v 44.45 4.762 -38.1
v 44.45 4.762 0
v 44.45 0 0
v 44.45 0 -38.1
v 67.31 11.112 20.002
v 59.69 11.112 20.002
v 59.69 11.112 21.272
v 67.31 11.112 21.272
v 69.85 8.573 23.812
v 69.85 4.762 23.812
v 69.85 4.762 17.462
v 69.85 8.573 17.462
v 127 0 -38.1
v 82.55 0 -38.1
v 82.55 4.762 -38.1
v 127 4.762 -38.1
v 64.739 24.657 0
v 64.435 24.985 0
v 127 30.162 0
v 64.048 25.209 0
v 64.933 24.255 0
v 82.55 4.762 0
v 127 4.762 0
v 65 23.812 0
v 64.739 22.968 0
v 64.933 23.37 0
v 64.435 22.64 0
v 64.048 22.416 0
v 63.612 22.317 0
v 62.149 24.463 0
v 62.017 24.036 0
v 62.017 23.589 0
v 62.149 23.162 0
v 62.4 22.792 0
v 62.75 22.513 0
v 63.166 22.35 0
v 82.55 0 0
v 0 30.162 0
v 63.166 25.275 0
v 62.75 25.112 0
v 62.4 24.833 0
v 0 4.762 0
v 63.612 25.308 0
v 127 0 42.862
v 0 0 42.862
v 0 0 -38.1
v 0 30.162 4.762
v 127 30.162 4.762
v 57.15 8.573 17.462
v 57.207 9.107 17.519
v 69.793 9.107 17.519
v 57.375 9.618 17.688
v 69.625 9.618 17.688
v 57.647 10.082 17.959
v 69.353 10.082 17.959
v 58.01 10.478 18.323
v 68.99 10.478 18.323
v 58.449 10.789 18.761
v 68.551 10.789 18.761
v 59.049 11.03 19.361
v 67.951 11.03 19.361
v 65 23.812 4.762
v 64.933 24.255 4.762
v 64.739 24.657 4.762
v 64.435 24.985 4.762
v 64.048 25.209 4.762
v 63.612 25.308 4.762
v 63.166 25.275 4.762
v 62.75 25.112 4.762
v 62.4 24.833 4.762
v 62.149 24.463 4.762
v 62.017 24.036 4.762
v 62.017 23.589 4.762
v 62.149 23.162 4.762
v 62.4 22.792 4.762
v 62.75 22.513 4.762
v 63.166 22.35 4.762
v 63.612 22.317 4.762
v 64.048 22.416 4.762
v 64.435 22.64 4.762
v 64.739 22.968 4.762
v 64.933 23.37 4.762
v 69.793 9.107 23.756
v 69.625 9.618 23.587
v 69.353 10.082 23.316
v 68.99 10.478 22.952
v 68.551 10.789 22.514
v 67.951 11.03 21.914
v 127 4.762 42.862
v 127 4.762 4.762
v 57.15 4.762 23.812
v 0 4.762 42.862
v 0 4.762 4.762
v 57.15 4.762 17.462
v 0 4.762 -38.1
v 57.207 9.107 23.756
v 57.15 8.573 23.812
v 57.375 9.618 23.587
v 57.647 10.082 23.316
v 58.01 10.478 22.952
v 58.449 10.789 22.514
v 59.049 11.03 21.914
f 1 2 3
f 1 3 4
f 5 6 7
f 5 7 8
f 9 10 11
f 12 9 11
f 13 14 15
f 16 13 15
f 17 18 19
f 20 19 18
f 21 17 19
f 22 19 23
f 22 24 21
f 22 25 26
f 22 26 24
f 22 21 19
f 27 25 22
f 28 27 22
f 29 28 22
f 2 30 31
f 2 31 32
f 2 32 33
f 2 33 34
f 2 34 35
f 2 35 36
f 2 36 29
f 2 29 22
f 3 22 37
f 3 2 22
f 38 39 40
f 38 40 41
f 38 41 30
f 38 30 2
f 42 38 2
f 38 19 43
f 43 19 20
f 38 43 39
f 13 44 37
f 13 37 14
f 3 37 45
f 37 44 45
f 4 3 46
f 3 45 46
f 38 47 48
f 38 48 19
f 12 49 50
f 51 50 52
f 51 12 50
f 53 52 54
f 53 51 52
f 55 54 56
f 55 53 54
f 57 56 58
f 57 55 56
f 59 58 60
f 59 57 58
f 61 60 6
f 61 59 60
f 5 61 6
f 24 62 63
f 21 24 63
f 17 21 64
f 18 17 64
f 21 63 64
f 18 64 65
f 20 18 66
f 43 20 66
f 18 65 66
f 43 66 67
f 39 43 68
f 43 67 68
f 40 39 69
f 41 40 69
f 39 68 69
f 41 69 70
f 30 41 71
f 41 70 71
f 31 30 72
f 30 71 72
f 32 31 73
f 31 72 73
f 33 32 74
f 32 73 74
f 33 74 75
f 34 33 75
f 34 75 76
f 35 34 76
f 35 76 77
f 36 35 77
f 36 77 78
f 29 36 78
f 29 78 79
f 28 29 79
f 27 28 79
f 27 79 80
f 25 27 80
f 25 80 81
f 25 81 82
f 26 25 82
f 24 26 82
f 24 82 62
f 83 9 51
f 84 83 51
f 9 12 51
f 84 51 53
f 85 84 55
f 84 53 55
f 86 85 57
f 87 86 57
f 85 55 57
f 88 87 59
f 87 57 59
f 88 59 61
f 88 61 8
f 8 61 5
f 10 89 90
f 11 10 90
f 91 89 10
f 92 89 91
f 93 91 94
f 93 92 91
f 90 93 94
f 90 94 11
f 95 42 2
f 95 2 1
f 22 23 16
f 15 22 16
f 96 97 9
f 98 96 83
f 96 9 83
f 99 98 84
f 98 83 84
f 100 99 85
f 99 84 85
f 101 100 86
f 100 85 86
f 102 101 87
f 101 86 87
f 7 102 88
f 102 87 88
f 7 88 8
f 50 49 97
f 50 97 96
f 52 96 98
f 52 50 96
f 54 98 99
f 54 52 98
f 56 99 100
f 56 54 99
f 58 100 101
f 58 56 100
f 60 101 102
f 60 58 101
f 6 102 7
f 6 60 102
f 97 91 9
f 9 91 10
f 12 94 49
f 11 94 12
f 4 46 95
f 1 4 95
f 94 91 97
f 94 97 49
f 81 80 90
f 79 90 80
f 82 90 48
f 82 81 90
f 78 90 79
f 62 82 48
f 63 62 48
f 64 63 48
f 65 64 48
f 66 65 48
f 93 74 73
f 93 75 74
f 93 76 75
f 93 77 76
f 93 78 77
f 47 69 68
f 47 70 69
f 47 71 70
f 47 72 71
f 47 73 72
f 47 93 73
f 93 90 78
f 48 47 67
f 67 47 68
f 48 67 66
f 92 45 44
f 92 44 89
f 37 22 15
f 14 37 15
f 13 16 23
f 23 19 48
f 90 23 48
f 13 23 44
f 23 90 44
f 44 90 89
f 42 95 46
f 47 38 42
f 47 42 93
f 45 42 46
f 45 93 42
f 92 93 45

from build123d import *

# Parameters (mm, degrees)
SKETCH1_W           = 38.1
SKETCH1_H           = 4.7625
BOSS_EXTRUDE1_DEPTH = 127
SKETCH2_W           = 12.7
SKETCH2_H           = 6.35
BOSS_EXTRUDE2_DEPTH = 6.35
SKETCH3_R           = 1.499997
CUT_EXTRUDE1_DEPTH  = 138.389847924
FILLET1_R           = 2.54
SKETCH4_W           = 38.1
SKETCH4_H           = 38.1
CUT_EXTRUDE2_DEPTH  = 137.423436059


with BuildPart() as part:
    # Sketch1 → Boss-Extrude1 (new body)
    with BuildSketch(Plane(origin=(0, 0, 0), x_dir=(0, 0, -1), z_dir=(1, 0, 0))):
        Polygon((0, 30.1625), (0, 0), (-42.8625, 0), (-42.8625, 4.7625), (-4.7625, 4.7625), (-4.7625, 30.1625), align=None)
        with Locations((19.05, 2.38125)):
            Rectangle(SKETCH1_W, SKETCH1_H)
    extrude(amount=BOSS_EXTRUDE1_DEPTH)

    # Sketch2 → Boss-Extrude2 (add)
    with BuildSketch(Plane(origin=(0, 4.7625, 0), x_dir=(1, 0, 0), z_dir=(0, 1, 0))):
        with Locations((63.5, -20.6375)):
            Rectangle(SKETCH2_W, SKETCH2_H)
    extrude(amount=BOSS_EXTRUDE2_DEPTH)

    # Sketch3 → Cut-Extrude1 (cut, through all)
    with BuildSketch(Plane.XY.offset(4.7625)):
        with Locations((63.5, 23.8125)):
            Circle(SKETCH3_R)
    extrude(amount=-CUT_EXTRUDE1_DEPTH, mode=Mode.SUBTRACT)

    # Fillet1
    fillet1_edges = [part.edges().sort_by_distance(p)[0] for p in [
        (57.15, 11.1125, 20.6375),
        (63.5, 11.1125, 23.8125),
        (69.85, 11.1125, 20.6375),
        (63.5, 11.1125, 17.4625),
    ]]
    fillet(fillet1_edges, radius=FILLET1_R)

    # Sketch4 → Cut-Extrude2 (cut, through all)
    with BuildSketch(Plane(origin=(0, 4.7625, 0), x_dir=(1, 0, 0), z_dir=(0, 1, 0))):
        with Locations((63.5, 19.05)):
            Rectangle(SKETCH4_W, SKETCH4_H)
    extrude(amount=-CUT_EXTRUDE2_DEPTH, mode=Mode.SUBTRACT)


solid = part.part
